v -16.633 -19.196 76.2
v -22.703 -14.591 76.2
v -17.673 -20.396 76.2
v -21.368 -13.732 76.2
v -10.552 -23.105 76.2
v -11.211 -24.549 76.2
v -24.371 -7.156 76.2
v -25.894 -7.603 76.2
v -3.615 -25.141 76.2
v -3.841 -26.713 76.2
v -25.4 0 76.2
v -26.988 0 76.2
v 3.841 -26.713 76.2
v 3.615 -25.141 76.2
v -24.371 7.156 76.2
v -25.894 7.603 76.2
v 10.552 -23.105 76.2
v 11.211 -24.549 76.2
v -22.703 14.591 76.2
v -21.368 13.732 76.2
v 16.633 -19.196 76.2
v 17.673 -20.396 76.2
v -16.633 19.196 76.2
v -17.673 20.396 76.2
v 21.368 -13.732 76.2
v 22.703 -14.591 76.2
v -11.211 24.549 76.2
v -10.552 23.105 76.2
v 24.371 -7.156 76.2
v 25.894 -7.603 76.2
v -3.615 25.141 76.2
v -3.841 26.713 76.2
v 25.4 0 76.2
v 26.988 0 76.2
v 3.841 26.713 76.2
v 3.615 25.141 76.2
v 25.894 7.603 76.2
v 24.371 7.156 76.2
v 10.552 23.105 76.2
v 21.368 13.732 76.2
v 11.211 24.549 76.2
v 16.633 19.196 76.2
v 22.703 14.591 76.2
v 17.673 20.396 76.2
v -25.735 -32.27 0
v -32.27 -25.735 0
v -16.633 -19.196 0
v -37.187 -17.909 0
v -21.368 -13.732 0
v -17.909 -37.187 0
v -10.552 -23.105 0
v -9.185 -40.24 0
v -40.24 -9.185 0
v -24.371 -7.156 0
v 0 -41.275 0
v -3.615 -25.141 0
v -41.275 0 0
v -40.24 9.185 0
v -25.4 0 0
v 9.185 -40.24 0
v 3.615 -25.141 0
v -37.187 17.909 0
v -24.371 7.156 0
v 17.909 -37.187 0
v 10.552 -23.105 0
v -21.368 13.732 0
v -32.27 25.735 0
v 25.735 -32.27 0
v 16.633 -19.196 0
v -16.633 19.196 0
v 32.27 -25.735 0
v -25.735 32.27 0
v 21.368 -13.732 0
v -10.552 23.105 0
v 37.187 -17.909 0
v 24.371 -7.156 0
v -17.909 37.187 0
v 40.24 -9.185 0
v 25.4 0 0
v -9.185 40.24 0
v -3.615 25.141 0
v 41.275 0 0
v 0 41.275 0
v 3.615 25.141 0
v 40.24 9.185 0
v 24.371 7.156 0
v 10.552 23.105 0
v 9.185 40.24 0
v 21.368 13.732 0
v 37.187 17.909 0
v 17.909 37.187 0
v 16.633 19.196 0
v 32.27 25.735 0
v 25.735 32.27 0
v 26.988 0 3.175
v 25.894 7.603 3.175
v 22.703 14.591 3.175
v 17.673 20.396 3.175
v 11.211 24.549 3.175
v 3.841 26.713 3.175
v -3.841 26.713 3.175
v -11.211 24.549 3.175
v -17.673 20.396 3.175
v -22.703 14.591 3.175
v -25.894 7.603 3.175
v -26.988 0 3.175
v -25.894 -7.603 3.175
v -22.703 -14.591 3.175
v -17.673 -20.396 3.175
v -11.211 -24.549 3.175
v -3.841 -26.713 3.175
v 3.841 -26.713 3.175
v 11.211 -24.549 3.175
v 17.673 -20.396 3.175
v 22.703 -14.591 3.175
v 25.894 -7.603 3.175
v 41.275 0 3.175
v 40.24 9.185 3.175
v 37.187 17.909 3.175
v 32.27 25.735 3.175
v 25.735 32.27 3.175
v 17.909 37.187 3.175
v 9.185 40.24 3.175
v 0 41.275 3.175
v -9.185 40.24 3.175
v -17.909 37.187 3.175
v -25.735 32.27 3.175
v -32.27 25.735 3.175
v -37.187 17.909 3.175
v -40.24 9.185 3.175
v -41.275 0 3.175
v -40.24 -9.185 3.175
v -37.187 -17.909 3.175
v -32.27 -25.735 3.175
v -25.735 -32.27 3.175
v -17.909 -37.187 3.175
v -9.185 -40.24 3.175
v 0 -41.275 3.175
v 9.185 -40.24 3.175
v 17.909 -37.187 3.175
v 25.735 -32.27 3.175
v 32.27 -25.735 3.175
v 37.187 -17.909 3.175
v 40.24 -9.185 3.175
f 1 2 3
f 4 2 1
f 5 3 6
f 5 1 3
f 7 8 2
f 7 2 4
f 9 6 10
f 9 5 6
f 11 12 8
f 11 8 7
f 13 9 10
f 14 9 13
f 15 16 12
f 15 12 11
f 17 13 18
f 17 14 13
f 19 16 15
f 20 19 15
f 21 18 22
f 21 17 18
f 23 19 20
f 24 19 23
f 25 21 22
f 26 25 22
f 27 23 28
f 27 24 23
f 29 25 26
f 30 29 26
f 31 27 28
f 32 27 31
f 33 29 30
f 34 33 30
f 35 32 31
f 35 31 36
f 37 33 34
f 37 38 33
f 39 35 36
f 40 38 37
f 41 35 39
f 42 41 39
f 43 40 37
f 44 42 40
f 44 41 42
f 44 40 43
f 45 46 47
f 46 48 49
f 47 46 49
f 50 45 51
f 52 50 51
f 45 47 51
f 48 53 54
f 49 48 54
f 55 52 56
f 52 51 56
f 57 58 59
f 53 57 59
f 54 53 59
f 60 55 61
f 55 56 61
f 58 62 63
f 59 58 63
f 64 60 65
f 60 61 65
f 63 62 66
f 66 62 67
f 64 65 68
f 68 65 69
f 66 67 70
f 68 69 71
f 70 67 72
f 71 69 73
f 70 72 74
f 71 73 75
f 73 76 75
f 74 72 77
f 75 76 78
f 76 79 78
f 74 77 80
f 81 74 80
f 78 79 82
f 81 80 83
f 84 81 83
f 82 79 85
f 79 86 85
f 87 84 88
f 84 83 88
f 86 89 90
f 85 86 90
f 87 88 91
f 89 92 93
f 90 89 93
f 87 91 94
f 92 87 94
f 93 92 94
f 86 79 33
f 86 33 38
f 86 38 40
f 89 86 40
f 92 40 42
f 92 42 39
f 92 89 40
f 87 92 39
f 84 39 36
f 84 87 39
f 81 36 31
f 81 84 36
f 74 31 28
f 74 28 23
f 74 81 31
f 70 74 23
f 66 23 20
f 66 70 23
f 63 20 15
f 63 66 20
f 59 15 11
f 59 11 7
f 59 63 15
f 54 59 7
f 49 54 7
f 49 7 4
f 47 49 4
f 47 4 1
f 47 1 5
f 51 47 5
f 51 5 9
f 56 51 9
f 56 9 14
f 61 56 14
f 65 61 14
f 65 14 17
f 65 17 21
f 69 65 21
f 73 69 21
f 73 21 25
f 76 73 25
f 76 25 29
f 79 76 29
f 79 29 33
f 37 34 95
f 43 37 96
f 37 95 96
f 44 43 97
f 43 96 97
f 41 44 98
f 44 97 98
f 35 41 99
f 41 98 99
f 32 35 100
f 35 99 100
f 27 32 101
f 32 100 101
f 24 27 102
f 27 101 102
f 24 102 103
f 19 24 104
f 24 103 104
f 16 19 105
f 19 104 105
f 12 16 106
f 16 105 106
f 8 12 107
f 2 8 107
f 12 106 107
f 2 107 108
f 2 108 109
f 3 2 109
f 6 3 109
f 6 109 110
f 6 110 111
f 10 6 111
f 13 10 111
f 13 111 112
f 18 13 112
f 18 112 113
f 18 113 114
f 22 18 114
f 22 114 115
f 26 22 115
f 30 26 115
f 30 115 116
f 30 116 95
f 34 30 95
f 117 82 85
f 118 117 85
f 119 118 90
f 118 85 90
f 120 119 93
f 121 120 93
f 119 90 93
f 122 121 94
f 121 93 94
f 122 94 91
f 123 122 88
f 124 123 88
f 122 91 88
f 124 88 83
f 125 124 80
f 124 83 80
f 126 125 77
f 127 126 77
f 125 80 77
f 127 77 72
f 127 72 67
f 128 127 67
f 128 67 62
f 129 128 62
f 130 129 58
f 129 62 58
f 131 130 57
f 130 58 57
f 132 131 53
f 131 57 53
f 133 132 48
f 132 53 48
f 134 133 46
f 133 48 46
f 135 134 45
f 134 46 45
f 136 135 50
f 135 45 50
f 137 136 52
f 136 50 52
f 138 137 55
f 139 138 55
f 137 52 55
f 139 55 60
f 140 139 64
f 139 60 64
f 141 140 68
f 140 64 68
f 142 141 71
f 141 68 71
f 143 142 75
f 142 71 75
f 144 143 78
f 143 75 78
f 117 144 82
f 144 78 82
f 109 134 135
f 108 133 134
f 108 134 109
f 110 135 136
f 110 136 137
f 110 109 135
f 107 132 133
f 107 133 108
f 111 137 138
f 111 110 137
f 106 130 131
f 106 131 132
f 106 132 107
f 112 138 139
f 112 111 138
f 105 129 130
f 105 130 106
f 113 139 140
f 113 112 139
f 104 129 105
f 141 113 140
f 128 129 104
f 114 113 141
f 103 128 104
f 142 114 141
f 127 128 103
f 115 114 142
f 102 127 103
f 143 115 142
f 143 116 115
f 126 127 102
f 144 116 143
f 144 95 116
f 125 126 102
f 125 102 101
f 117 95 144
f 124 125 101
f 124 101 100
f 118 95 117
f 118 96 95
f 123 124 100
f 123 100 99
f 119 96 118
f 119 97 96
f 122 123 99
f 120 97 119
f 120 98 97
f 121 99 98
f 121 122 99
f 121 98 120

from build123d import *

# Parameters (mm, degrees)
TUBE001_R     = 41.275
TUBE001_R_2   = 25.4
TUBE001_DEPTH = 3.175
TUBE_R        = 26.9875
TUBE_R_2      = 25.4
TUBE_DEPTH    = 76.2


with BuildPart() as tube001:
    # Tube001 → Tube001 (new body)
    with BuildSketch(Plane.XY):
        Circle(TUBE001_R)
        Circle(TUBE001_R_2, mode=Mode.SUBTRACT)
    extrude(amount=TUBE001_DEPTH)


with BuildPart() as fusion:
    # Tube → Tube (new body)
    with BuildSketch(Plane.XY):
        Circle(TUBE_R)
        Circle(TUBE_R_2, mode=Mode.SUBTRACT)
    extrude(amount=TUBE_DEPTH)

    # Fusion: union Tube001
    add(tube001.part)


solid = fusion.part
